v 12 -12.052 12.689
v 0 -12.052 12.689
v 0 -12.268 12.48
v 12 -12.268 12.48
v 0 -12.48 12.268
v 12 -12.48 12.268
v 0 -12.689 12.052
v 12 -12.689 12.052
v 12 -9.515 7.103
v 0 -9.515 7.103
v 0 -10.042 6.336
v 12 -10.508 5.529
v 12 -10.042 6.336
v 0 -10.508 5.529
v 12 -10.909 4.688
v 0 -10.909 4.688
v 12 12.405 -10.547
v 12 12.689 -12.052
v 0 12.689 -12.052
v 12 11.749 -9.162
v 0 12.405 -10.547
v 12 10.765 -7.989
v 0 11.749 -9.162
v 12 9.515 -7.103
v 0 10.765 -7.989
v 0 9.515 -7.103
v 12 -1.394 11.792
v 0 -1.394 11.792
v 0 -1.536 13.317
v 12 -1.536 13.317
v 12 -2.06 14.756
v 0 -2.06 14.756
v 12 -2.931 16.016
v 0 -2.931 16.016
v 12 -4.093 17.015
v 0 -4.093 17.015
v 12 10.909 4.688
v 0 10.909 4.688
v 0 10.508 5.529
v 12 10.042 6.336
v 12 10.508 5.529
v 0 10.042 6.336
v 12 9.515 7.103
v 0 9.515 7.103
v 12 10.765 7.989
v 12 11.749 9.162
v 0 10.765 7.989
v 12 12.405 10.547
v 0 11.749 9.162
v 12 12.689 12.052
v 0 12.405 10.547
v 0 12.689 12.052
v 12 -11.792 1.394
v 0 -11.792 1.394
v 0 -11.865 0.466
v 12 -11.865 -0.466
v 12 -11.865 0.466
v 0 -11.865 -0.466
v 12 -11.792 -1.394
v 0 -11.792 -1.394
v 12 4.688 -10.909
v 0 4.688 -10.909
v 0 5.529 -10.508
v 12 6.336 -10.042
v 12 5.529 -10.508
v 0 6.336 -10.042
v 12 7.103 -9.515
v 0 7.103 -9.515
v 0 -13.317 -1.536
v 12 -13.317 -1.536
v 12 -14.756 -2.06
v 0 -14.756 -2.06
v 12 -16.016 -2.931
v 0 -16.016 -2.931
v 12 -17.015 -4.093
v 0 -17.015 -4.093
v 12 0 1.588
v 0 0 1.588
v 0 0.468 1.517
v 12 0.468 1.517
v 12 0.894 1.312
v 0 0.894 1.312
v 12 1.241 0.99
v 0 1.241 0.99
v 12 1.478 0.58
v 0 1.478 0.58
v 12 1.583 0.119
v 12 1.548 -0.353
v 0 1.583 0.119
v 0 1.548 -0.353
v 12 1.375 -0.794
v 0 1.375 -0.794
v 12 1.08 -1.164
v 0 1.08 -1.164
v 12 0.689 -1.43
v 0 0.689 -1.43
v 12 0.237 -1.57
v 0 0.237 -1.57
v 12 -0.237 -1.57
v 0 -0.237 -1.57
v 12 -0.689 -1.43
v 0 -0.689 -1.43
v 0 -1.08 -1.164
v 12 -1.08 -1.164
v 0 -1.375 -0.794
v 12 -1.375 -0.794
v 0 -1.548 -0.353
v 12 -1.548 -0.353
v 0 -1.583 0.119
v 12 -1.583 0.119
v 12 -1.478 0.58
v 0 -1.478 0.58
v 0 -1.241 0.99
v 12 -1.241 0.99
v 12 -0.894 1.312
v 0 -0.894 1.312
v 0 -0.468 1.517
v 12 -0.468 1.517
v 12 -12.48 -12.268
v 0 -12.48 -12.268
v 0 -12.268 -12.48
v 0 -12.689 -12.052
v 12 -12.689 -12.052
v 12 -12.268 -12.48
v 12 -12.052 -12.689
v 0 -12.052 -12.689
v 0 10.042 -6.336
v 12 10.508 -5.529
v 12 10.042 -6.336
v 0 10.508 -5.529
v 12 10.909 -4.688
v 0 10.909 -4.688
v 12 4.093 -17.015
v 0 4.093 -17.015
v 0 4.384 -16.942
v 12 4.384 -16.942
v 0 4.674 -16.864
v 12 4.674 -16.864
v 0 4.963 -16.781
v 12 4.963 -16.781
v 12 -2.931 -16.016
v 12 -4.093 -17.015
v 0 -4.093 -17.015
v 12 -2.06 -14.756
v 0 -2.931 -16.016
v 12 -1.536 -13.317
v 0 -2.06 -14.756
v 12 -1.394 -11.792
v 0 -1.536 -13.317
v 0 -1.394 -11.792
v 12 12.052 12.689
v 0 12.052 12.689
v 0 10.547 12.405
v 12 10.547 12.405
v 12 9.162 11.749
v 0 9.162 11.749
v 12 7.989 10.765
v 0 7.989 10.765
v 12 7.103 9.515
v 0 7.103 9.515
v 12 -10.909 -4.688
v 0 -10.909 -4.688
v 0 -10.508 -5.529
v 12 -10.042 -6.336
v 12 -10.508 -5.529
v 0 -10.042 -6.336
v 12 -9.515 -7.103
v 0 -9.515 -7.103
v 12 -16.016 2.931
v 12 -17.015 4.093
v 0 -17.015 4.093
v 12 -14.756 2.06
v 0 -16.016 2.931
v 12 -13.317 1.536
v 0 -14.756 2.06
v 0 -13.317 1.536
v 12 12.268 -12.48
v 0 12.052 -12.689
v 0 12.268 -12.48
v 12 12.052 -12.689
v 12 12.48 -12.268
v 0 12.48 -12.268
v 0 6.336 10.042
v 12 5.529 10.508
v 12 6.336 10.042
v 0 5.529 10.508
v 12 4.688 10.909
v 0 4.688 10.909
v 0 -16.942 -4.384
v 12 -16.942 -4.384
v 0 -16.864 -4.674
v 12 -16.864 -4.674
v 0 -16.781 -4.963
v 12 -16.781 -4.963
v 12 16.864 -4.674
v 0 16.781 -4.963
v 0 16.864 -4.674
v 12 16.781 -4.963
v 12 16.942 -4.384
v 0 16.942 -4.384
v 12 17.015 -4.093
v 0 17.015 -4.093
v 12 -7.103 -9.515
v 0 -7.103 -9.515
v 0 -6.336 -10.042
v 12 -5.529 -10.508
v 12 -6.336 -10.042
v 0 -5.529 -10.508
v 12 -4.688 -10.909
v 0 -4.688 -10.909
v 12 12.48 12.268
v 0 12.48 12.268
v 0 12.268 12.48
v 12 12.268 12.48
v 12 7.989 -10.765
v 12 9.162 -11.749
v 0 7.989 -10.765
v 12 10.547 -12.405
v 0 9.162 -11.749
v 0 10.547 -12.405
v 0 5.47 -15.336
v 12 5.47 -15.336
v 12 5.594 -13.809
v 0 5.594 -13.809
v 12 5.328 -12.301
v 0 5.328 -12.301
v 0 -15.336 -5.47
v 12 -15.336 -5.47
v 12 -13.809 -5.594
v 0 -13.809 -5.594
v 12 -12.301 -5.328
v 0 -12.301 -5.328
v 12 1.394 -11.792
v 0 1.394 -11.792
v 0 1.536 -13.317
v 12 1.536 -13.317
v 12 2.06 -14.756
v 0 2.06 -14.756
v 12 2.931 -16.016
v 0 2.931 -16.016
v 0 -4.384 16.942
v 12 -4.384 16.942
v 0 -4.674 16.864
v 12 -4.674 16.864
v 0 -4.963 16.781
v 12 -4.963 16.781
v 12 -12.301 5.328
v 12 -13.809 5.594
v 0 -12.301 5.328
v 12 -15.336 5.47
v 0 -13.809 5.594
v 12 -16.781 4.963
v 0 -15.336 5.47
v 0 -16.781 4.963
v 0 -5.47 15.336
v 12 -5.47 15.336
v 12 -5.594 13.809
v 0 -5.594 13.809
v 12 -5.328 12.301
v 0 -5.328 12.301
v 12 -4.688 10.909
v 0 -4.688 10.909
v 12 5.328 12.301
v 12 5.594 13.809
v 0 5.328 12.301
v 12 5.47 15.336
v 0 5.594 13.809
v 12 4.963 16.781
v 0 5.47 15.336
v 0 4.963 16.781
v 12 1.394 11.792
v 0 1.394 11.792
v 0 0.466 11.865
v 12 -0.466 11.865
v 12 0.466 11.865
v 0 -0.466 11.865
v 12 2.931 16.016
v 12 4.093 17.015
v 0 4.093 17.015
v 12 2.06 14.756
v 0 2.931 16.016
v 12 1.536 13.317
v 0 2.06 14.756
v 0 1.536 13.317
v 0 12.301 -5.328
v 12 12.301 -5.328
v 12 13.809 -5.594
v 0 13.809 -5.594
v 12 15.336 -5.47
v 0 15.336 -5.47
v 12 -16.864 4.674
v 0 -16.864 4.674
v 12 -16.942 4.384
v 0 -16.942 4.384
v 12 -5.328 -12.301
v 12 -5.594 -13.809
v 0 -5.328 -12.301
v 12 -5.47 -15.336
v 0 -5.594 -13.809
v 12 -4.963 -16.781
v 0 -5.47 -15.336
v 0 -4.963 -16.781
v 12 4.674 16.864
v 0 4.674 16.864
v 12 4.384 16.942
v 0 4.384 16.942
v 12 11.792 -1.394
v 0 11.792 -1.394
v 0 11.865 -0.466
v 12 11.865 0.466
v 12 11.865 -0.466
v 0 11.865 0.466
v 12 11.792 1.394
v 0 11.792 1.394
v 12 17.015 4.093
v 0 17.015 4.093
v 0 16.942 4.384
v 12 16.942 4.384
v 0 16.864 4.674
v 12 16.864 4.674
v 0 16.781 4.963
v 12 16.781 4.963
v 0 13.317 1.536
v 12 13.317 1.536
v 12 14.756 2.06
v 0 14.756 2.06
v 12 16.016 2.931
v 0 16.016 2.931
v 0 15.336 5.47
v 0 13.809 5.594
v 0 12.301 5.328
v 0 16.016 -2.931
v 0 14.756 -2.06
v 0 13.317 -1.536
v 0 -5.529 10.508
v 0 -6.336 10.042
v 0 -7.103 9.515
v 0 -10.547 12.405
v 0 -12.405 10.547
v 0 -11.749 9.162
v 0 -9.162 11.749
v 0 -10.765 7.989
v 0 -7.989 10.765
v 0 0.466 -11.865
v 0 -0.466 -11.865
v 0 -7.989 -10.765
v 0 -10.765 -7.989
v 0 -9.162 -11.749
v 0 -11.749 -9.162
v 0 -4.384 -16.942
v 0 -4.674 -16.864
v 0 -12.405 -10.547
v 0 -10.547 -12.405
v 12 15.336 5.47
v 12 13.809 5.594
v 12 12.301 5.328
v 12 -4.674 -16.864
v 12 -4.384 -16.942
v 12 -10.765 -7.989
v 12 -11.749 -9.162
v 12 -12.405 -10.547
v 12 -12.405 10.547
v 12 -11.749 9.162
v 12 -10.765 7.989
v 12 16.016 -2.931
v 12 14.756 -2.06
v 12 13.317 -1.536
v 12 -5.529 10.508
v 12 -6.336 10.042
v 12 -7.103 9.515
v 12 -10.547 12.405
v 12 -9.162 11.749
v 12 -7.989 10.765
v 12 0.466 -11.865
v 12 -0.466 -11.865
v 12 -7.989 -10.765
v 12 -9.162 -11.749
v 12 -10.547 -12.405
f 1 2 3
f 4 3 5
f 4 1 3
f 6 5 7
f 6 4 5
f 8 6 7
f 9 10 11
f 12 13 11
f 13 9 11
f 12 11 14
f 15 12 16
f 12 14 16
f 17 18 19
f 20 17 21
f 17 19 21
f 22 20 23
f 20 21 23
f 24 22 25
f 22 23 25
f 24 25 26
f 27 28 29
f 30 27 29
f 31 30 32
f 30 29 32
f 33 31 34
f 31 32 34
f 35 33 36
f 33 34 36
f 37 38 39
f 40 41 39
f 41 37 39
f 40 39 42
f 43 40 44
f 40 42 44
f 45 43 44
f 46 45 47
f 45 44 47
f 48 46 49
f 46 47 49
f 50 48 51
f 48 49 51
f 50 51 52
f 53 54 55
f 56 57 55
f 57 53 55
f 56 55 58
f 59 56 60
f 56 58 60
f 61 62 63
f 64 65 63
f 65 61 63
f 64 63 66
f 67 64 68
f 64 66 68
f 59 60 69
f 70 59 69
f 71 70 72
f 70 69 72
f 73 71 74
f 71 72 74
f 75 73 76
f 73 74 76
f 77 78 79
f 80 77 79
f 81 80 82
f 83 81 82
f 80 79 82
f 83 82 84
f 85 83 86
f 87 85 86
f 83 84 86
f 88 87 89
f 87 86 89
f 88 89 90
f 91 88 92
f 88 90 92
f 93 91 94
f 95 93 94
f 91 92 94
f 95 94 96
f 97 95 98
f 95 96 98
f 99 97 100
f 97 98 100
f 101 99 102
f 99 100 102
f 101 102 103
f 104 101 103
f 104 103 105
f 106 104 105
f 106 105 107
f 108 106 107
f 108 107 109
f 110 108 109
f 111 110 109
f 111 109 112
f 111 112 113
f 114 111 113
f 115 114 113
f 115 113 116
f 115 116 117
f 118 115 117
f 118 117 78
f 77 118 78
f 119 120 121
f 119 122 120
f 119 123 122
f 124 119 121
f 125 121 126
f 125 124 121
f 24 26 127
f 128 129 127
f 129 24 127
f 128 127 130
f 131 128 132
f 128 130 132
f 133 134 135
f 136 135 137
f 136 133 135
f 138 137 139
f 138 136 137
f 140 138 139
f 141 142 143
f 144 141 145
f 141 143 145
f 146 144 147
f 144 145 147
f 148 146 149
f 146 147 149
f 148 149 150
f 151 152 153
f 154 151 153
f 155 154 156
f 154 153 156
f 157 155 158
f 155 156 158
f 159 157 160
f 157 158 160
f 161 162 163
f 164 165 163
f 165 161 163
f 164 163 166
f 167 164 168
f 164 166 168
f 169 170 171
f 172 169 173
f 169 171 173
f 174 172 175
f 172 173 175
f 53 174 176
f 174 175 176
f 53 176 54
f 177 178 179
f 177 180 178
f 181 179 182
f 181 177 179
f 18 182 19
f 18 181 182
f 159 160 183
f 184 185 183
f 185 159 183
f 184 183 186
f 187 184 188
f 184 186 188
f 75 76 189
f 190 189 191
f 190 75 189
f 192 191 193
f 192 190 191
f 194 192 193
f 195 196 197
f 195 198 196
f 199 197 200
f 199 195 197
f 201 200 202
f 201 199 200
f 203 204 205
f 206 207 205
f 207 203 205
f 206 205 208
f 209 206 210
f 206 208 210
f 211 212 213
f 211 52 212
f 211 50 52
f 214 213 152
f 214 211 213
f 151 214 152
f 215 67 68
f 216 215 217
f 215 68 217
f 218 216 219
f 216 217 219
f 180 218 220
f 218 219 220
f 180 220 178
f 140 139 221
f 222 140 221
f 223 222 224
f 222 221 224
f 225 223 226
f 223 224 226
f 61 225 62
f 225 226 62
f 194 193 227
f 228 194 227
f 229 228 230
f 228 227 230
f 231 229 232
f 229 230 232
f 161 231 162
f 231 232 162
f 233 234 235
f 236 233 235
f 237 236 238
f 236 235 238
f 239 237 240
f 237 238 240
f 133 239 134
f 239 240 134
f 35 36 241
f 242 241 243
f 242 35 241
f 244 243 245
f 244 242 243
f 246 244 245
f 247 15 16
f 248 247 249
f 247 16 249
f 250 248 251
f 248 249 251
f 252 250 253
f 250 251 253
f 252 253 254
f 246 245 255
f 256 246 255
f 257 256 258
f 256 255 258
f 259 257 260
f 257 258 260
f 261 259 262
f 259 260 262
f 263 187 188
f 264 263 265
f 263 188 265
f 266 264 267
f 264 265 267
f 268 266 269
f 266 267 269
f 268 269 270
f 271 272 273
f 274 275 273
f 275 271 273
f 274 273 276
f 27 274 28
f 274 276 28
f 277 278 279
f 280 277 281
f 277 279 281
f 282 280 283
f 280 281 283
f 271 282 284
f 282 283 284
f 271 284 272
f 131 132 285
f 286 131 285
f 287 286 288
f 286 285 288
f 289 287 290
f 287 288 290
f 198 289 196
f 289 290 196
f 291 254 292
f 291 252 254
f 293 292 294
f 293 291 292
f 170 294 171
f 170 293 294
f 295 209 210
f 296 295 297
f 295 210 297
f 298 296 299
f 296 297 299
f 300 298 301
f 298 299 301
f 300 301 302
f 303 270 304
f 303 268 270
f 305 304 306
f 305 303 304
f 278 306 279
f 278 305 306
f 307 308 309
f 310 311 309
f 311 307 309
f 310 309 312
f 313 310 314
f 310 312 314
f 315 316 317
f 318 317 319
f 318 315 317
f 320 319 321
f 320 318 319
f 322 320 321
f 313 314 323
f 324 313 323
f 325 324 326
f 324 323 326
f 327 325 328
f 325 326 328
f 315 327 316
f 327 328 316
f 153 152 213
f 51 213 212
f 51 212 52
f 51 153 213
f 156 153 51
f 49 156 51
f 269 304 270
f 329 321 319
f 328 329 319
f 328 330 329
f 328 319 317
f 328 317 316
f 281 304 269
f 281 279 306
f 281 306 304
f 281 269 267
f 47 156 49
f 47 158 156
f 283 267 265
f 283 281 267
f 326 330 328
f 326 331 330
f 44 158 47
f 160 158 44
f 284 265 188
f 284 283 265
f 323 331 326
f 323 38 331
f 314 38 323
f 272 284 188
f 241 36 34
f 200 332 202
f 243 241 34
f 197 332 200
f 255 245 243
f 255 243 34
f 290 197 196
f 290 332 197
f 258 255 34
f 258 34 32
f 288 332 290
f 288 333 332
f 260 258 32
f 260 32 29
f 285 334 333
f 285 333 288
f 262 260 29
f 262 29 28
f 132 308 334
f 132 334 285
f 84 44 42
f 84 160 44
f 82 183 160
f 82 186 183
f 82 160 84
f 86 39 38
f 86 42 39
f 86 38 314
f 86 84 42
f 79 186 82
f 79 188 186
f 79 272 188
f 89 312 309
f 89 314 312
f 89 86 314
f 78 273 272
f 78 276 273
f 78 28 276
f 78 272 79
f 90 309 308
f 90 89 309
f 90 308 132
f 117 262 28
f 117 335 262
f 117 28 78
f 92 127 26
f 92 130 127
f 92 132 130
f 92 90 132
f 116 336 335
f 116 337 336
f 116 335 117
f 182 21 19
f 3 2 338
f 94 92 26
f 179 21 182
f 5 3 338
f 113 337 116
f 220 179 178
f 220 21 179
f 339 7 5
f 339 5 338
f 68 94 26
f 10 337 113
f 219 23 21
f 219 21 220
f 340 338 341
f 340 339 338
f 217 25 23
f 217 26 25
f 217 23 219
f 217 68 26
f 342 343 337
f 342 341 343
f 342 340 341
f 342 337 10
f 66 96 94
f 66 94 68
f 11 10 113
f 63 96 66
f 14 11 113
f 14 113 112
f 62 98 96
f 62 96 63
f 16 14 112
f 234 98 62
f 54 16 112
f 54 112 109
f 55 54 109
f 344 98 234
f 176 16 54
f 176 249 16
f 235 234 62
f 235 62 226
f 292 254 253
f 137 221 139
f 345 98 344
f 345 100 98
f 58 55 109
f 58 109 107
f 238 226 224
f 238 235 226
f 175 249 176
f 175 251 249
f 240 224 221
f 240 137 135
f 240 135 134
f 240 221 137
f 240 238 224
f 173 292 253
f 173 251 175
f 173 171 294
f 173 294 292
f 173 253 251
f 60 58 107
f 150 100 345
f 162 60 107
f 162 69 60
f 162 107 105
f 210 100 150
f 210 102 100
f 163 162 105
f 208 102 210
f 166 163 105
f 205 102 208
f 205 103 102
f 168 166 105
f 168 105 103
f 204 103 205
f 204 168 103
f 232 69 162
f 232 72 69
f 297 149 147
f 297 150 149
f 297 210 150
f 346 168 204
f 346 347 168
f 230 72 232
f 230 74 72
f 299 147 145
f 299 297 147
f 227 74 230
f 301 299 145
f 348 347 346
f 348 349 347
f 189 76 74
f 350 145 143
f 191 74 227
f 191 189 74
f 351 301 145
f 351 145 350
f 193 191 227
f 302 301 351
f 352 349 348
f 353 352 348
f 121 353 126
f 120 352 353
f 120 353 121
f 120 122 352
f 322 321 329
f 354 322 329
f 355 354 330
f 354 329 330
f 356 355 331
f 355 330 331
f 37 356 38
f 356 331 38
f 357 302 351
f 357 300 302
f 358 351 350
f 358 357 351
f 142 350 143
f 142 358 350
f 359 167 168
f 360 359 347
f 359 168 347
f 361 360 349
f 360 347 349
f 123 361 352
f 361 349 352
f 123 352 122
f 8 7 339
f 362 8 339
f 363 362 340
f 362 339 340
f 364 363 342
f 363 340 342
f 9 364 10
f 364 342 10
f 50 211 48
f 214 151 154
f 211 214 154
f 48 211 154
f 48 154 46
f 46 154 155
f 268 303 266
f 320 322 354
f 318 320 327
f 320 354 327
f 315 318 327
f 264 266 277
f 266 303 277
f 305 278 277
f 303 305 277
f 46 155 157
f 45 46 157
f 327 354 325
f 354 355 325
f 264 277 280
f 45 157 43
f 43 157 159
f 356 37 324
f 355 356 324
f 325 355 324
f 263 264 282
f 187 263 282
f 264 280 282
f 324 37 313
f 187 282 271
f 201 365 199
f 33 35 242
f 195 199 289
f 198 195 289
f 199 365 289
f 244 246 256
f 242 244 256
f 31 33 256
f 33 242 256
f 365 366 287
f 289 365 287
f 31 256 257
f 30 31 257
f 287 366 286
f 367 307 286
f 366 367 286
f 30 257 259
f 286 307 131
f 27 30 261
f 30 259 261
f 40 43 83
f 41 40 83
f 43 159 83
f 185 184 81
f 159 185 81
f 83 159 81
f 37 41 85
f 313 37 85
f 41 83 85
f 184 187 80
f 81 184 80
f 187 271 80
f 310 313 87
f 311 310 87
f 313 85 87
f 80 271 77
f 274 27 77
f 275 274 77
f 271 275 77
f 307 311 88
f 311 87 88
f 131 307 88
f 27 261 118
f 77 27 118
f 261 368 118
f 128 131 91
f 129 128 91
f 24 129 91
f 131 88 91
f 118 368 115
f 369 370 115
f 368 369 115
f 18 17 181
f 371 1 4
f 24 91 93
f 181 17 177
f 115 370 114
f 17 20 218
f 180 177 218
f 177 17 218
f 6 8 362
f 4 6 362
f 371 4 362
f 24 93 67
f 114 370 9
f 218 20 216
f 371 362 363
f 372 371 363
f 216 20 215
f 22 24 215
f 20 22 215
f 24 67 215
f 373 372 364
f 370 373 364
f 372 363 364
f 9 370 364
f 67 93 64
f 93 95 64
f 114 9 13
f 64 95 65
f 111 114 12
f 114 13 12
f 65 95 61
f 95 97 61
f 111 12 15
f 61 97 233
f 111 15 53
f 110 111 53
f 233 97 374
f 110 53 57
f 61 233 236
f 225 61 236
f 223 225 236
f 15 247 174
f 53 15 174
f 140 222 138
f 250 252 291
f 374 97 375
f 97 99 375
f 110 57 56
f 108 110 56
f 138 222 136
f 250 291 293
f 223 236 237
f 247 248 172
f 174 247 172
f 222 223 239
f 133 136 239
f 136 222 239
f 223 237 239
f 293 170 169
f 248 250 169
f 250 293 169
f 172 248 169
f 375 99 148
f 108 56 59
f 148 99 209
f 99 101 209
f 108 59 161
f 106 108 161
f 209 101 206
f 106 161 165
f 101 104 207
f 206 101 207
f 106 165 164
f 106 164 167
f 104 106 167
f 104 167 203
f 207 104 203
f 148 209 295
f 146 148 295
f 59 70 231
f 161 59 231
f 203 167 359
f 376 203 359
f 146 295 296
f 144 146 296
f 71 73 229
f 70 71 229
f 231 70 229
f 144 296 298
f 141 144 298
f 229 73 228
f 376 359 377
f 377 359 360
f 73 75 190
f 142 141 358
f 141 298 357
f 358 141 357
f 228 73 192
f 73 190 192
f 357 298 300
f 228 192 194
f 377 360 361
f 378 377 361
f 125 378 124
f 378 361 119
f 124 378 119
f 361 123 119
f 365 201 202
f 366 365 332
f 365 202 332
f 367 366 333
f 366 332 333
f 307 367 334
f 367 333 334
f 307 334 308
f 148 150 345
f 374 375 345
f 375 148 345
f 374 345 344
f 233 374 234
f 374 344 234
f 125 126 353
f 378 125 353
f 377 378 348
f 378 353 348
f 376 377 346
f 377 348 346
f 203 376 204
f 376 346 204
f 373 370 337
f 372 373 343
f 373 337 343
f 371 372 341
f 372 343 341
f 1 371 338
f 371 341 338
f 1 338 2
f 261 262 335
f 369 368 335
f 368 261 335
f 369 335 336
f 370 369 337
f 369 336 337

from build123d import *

# Parameters (mm, degrees)
BASPROSKE_W           = 12
BASPROSKE_H           = 17.5
TOOTHCUT_DEPTH        = 28.504545079
TEETHCUTS_COUNT       = 12
TEETHCUTS_ANGLE       = 330
BORSKE_R              = 1.5
BORE_DEPTH            = 50.0000508
CROQUIS1_R            = 1.5875
CORTAR_EXTRUIR1_DEPTH = 27.88866135


with BuildPart() as part:
    # BasProSke → Base-Revolve (revolve)
    with BuildSketch(Plane(origin=(0, 0, 0), x_dir=(1, 0, 0), z_dir=(0, 1, 0)), mode=Mode.PRIVATE) as base_revolve_sk:
        with Locations((6, 8.75)):
            Rectangle(BASPROSKE_W, BASPROSKE_H)
    revolve(base_revolve_sk.sketch.rotate(Axis((-10, 0, 0), (1, 0, 0)), 180), axis=Axis((-10, 0, 0), (1, 0, 0)))

    # TooCutSke → ToothCut (cut, through all)
    with BuildSketch(Plane(origin=(0, 0, 0), x_dir=(0, 0, -1), z_dir=(1, 0, 0))):
        with BuildLine():
            ThreePointArc((1.394381134, 11.791843675), (0, 11.874), (-1.394381134, 11.791843675))
            ThreePointArc((-1.394381134, 11.791843675), (-2.068078374, 14.771857381), (-4.121860996, 17.033787221))
            ThreePointArc((-4.121860996, 17.033787221), (0, 17.5254), (4.121860996, 17.033787221))
            ThreePointArc((4.121860996, 17.033787221), (2.068078374, 14.771857381), (1.394381134, 11.791843675))
        make_face()
    toothcut = extrude(amount=TOOTHCUT_DEPTH, mode=Mode.SUBTRACT)

    # TeethCuts: ToothCut ×12 about axis
    teethcuts_axis = Axis((-10, 0, 0), (1, 0, 0))
    for i in range(1, TEETHCUTS_COUNT):
        add(toothcut.rotate(teethcuts_axis, i * TEETHCUTS_ANGLE / (TEETHCUTS_COUNT - 1)), mode=Mode.SUBTRACT)

    # BorSke → Bore (cut, symmetric)
    with BuildSketch(Plane(origin=(0, 0, 0), x_dir=(0, 0, -1), z_dir=(1, 0, 0))):
        with Locations(Location((0, 0, 0), (0, 0, 180))):
            Circle(BORSKE_R)
    extrude(amount=BORE_DEPTH, both=True, mode=Mode.SUBTRACT)

    # Croquis1 → Cortar-Extruir1 (cut, through all)
    with BuildSketch(Plane.ZY):
        Circle(CROQUIS1_R)
    extrude(amount=-CORTAR_EXTRUIR1_DEPTH, mode=Mode.SUBTRACT)


solid = part.part
